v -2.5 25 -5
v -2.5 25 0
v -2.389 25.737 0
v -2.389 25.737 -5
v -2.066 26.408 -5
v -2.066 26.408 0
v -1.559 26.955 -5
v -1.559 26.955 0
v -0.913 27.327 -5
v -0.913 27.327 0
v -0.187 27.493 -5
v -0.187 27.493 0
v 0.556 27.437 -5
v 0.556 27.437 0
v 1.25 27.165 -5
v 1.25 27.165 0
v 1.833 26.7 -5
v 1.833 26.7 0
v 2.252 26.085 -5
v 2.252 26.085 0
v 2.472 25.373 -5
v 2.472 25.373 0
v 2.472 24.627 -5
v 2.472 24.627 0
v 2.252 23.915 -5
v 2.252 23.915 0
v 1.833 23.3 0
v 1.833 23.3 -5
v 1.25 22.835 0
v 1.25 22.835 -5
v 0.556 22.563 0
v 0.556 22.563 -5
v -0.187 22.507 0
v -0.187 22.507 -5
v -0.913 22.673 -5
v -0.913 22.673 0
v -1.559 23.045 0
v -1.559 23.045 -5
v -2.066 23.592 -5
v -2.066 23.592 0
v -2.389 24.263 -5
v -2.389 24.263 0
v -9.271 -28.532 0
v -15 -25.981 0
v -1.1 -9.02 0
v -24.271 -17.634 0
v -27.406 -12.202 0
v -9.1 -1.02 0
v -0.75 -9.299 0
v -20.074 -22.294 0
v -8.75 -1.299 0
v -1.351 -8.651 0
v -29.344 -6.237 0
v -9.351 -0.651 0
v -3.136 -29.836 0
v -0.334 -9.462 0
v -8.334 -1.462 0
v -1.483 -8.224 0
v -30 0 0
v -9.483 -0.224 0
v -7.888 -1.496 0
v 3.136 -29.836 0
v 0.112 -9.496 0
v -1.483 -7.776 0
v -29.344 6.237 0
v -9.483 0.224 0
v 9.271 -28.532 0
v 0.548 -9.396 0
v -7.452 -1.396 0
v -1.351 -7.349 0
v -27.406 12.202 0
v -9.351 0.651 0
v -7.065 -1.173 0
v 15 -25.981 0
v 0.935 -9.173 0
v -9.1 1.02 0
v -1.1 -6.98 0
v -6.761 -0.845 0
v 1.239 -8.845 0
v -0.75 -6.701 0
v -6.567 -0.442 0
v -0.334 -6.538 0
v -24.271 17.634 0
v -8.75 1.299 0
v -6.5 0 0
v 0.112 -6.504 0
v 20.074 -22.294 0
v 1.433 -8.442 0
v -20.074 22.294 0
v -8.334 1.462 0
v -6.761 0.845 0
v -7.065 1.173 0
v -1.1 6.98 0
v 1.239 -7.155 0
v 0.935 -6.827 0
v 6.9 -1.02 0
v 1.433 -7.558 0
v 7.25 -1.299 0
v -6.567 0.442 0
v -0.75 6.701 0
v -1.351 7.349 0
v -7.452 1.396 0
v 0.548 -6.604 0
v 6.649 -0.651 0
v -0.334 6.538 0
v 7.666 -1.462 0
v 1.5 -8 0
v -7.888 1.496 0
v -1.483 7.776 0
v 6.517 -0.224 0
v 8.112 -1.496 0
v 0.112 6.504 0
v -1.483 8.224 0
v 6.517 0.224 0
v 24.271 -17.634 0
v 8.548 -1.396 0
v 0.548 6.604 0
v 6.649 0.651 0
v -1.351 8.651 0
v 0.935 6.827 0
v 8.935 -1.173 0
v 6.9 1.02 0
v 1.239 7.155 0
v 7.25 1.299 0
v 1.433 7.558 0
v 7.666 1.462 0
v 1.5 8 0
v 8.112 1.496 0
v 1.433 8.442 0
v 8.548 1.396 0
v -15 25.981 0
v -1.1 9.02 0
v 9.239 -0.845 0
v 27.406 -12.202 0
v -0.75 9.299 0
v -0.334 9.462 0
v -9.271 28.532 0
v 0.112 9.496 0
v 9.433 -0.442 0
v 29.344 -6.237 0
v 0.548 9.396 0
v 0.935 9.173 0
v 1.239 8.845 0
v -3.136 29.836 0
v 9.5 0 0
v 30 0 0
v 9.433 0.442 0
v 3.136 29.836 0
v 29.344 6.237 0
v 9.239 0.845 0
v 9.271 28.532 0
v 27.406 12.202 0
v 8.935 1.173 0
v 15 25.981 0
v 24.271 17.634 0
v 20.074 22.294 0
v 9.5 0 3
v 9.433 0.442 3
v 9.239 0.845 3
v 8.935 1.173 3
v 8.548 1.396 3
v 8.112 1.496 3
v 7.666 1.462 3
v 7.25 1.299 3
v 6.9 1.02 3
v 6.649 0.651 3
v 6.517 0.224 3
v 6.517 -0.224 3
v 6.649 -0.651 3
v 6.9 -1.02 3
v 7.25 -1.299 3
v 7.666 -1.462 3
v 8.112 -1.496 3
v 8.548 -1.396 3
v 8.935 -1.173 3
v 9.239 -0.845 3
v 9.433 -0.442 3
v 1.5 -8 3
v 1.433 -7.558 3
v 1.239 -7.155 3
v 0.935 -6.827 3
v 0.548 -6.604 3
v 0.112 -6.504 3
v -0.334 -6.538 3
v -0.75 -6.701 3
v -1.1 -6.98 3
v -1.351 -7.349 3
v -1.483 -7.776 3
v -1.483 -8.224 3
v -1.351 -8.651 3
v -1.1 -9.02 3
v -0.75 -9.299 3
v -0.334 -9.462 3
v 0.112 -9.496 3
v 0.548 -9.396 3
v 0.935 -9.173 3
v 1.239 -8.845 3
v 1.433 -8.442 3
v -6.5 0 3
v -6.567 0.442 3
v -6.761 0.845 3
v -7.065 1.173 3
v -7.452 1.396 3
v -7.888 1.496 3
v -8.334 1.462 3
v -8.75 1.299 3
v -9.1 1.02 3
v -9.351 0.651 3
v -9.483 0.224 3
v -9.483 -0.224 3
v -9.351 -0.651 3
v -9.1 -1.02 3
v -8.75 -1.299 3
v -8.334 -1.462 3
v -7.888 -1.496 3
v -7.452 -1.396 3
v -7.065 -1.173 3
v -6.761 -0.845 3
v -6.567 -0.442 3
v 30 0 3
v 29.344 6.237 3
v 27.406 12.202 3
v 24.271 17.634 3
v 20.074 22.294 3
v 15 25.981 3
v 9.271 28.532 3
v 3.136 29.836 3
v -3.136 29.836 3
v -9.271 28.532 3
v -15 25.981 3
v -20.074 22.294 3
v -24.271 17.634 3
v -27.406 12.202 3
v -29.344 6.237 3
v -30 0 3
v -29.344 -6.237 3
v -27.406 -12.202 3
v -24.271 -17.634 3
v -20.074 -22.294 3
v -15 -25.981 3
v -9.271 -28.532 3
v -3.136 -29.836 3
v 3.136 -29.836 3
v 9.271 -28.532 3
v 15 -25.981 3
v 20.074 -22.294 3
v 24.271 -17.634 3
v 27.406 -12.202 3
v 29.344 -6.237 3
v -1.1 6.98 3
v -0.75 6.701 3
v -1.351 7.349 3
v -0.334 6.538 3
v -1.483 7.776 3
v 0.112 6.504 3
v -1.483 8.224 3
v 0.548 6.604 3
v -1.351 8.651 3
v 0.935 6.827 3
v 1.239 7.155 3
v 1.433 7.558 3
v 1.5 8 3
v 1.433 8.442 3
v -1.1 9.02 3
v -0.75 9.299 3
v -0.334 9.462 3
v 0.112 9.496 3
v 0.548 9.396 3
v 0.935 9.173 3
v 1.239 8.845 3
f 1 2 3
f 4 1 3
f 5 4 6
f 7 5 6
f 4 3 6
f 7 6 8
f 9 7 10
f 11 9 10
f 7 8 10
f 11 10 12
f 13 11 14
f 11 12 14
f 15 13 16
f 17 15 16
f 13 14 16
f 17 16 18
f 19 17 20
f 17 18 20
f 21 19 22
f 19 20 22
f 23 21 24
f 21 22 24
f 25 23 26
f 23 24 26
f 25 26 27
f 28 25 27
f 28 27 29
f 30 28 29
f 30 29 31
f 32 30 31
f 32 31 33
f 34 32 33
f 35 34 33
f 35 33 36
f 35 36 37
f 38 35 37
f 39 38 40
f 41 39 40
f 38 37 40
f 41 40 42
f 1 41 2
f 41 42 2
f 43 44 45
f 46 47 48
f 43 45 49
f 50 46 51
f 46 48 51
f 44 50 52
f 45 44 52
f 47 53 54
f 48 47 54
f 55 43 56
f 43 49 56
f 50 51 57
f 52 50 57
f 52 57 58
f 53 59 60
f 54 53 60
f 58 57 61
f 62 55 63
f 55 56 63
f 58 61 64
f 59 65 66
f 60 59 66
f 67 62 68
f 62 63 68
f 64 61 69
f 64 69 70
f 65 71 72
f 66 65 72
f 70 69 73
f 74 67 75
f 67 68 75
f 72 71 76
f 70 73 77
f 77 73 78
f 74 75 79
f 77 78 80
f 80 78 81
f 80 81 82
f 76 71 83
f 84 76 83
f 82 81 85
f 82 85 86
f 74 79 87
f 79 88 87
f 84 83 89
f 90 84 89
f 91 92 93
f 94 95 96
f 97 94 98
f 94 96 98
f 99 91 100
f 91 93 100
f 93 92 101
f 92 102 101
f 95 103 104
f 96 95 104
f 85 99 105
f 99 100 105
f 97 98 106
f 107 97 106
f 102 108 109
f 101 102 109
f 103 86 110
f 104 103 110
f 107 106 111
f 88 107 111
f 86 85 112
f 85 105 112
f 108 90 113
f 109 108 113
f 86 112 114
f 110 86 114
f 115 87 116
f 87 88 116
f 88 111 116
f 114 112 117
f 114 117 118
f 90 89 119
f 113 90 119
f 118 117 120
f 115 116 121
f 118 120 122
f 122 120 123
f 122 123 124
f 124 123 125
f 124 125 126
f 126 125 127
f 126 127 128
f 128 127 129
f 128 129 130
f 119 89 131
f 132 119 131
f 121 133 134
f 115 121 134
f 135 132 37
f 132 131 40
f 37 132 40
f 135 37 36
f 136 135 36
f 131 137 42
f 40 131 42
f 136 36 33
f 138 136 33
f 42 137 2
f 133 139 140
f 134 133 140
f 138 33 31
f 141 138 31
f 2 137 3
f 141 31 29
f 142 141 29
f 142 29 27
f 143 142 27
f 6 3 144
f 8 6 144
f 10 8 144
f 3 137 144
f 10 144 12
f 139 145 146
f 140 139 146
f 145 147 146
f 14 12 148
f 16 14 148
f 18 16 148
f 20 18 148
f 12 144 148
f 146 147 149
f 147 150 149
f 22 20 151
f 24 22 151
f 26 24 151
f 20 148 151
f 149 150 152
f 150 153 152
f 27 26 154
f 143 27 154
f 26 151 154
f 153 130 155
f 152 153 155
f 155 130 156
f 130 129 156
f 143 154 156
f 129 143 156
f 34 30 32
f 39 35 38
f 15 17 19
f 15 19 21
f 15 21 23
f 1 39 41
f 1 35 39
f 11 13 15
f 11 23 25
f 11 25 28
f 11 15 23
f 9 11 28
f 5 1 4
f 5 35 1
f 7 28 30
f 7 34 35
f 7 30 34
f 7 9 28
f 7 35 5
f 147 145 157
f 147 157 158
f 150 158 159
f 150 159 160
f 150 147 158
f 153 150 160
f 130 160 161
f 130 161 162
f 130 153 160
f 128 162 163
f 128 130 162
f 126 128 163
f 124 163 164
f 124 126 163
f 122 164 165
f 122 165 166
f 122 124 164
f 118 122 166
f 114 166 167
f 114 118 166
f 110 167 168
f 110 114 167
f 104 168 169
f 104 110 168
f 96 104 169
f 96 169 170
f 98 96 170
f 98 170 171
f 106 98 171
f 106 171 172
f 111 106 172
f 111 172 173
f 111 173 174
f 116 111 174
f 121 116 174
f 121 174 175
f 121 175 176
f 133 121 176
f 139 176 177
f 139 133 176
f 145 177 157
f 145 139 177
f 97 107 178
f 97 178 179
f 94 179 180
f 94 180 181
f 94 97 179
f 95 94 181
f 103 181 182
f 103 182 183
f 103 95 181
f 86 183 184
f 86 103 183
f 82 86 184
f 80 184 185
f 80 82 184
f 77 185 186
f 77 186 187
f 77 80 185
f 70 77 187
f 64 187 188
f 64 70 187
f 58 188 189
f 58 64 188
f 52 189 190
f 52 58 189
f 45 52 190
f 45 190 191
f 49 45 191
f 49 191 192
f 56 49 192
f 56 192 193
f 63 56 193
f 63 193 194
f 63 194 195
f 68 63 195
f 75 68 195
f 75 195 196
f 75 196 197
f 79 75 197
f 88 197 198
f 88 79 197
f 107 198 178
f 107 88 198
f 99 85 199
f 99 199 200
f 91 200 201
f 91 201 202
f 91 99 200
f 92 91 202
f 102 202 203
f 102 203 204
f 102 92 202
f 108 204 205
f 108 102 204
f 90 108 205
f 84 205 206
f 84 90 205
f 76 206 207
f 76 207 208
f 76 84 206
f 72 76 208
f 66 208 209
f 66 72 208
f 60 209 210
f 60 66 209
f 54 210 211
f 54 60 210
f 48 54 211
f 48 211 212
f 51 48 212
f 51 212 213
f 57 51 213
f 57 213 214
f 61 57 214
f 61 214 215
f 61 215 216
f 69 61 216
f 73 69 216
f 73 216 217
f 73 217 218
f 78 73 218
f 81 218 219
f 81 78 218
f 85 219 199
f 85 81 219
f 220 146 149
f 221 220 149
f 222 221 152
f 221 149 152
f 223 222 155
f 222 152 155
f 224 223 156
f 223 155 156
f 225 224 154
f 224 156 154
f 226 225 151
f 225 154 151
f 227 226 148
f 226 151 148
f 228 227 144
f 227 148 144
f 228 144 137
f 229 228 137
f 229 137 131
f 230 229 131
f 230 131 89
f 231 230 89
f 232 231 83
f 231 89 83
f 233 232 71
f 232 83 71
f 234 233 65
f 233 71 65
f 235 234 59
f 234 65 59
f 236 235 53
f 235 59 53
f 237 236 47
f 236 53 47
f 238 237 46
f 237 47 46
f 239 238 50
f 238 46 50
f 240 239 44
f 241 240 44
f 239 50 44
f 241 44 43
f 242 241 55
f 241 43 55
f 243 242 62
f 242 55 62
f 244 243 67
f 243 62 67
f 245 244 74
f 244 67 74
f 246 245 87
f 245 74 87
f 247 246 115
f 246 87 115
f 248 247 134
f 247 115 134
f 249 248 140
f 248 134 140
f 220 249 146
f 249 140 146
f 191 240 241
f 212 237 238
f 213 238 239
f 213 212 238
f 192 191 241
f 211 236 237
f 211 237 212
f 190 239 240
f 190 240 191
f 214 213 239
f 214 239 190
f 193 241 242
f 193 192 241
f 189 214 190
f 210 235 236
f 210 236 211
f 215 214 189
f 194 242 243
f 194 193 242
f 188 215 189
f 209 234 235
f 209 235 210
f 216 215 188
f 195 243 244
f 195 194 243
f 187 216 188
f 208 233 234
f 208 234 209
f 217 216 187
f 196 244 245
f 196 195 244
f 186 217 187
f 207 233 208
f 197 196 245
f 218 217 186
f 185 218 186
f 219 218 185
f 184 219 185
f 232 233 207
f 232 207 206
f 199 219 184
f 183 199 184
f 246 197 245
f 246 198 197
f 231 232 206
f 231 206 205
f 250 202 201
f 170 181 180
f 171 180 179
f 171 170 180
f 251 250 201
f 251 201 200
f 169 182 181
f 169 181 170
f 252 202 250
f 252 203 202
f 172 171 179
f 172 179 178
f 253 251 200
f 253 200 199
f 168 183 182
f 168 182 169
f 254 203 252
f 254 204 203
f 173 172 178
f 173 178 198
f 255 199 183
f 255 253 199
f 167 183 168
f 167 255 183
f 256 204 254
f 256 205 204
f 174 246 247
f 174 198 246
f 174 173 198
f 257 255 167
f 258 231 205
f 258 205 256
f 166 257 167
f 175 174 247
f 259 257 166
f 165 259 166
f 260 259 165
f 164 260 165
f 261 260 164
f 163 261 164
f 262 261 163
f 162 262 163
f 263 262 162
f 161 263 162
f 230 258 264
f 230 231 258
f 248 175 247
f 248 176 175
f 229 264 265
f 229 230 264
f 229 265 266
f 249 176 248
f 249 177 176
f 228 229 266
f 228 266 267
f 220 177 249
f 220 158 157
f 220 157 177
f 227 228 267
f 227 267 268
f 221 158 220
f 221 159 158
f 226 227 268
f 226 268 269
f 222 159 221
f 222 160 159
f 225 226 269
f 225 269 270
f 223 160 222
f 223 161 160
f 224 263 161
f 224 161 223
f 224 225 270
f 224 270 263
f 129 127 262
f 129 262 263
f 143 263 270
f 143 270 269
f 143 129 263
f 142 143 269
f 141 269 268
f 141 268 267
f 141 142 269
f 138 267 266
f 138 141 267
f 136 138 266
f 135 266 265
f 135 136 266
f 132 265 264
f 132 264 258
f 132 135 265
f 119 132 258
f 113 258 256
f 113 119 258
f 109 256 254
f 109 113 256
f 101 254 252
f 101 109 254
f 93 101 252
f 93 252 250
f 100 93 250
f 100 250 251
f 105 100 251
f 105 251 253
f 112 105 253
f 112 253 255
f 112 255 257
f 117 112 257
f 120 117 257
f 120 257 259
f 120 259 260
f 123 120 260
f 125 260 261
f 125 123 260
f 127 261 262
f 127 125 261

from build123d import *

# Parameters (mm, degrees)
SKETCH3_R           = 30
SKETCH3_R_2         = 1.5
BOSS_EXTRUDE2_DEPTH = 3
SKETCH4_R           = 2.5
BOSS_EXTRUDE3_DEPTH = 5


with BuildPart() as part:
    # Sketch3 → Boss-Extrude2 (new body)
    with BuildSketch(Plane.XY):
        Circle(SKETCH3_R)
        with Locations((-8, 0)):
            Circle(SKETCH3_R_2, mode=Mode.SUBTRACT)
        with Locations((0, 8)):
            Circle(SKETCH3_R_2, mode=Mode.SUBTRACT)
        with Locations((8, 0)):
            Circle(SKETCH3_R_2, mode=Mode.SUBTRACT)
        with Locations((0, -8)):
            Circle(SKETCH3_R_2, mode=Mode.SUBTRACT)
    extrude(amount=BOSS_EXTRUDE2_DEPTH)

    # Sketch4 → Boss-Extrude3 (add)
    with BuildSketch(Plane(origin=(0, 0, 0), x_dir=(-1, 0, 0), z_dir=(0, 0, -1))):
        with Locations((0, 25)):
            Circle(SKETCH4_R)
    extrude(amount=BOSS_EXTRUDE3_DEPTH)


solid = part.part
